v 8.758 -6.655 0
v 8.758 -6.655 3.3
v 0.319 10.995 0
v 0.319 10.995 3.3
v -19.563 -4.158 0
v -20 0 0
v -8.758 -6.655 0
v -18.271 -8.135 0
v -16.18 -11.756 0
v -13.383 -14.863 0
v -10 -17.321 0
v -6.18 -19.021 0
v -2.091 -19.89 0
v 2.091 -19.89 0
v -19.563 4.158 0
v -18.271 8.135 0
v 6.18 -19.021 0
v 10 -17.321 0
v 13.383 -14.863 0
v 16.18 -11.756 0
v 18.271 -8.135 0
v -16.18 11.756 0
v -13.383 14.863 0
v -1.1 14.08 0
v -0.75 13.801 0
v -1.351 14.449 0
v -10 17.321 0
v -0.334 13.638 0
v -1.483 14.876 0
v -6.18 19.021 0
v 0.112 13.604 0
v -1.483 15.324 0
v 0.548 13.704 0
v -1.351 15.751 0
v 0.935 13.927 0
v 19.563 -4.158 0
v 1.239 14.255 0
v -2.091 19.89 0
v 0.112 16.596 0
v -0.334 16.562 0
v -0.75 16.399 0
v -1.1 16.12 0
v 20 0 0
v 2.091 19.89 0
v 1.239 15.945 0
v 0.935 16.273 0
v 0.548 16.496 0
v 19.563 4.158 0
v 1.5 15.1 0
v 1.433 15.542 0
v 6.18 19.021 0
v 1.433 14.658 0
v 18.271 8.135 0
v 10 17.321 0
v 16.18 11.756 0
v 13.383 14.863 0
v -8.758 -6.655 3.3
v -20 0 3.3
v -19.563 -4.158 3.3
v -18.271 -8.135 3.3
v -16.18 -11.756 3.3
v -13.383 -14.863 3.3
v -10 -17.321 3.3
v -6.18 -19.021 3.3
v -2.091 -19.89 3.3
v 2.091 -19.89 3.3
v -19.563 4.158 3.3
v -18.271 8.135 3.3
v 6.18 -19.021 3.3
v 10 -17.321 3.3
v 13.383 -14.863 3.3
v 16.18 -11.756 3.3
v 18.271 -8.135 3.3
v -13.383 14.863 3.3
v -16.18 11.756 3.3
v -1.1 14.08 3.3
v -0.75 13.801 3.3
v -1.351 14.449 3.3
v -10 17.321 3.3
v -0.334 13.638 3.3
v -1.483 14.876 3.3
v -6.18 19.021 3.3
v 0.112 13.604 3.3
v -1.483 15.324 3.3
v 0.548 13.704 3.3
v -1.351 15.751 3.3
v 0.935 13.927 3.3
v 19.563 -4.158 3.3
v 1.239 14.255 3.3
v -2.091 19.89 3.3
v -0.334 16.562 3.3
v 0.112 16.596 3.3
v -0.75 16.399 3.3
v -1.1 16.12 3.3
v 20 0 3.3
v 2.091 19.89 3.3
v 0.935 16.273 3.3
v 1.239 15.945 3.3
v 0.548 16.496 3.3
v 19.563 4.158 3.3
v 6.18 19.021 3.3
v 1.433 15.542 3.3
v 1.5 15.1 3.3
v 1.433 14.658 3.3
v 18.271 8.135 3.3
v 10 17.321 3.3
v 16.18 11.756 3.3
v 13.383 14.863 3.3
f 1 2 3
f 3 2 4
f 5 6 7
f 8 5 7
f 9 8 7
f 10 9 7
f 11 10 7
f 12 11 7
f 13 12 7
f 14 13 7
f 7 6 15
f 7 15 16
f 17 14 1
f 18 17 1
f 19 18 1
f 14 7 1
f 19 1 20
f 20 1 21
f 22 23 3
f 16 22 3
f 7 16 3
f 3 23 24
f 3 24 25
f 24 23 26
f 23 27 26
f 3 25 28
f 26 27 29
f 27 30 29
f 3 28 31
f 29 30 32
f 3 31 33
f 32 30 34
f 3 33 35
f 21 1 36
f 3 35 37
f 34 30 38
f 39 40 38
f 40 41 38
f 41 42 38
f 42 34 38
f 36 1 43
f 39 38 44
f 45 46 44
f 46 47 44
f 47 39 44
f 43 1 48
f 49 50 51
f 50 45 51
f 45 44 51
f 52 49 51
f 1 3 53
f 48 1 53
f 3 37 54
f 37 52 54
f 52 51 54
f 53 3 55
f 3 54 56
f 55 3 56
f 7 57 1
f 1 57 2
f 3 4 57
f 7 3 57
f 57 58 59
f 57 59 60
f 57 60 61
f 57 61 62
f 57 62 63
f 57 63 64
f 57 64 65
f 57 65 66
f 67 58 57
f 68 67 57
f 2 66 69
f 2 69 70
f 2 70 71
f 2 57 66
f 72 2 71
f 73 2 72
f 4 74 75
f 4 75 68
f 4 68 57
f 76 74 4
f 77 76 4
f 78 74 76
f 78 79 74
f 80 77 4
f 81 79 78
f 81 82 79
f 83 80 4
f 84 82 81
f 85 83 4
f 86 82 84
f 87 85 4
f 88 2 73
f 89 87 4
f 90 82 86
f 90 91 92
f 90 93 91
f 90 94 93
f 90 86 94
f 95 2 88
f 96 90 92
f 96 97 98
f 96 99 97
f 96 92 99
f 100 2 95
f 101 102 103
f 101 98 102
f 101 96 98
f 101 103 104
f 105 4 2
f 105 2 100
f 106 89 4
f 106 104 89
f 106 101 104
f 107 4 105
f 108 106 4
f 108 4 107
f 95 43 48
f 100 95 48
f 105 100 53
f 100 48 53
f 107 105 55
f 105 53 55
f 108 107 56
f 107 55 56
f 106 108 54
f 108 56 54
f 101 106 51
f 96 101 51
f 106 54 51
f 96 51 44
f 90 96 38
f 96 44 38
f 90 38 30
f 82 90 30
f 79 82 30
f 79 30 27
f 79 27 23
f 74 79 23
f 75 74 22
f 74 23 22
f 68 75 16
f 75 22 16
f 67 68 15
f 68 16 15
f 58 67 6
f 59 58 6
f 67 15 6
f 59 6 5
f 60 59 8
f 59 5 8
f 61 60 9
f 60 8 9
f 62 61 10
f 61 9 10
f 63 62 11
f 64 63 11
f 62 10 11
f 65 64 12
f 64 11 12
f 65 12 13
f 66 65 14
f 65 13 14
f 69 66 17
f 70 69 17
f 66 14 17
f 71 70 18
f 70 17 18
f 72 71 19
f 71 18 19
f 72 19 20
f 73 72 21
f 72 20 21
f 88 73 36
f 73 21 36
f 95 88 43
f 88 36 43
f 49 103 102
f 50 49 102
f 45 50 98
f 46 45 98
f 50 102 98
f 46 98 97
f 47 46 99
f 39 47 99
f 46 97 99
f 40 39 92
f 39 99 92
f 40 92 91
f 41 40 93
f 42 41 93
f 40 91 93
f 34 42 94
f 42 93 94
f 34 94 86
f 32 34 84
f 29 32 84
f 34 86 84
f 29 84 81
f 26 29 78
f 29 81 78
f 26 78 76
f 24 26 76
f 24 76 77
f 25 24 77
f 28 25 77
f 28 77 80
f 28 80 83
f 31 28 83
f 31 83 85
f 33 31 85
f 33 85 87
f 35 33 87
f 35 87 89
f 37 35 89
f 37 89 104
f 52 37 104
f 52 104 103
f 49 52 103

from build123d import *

# Parameters (mm, degrees)
CYLINDER_R      = 20
CYLINDER_DEPTH  = 3.3
SKETCH_R        = 1.5
POCKET_DEPTH    = 3.301
POCKET001_DEPTH = 5


with BuildPart() as part:
    # Cylinder → Cylinder (new body)
    with BuildSketch(Plane.XY):
        Circle(CYLINDER_R)
    extrude(amount=CYLINDER_DEPTH)

    # Sketch (on Face2 of Cylinder) → Pocket (cut, through all)
    with BuildSketch(Plane.XY.offset(3.3)):
        with Locations((0, 15.1)):
            Circle(SKETCH_R)
    extrude(amount=-POCKET_DEPTH, mode=Mode.SUBTRACT)

    # Sketch001 (on Face2 of Pocket) → Pocket001 (cut)
    with BuildSketch(Plane.XY.offset(3.3)):
        Polygon((0.318612, 10.995385), (-8.758163, -6.655418), (8.758163, -6.655418), align=None)
    extrude(amount=-POCKET001_DEPTH, mode=Mode.SUBTRACT)


solid = part.part
